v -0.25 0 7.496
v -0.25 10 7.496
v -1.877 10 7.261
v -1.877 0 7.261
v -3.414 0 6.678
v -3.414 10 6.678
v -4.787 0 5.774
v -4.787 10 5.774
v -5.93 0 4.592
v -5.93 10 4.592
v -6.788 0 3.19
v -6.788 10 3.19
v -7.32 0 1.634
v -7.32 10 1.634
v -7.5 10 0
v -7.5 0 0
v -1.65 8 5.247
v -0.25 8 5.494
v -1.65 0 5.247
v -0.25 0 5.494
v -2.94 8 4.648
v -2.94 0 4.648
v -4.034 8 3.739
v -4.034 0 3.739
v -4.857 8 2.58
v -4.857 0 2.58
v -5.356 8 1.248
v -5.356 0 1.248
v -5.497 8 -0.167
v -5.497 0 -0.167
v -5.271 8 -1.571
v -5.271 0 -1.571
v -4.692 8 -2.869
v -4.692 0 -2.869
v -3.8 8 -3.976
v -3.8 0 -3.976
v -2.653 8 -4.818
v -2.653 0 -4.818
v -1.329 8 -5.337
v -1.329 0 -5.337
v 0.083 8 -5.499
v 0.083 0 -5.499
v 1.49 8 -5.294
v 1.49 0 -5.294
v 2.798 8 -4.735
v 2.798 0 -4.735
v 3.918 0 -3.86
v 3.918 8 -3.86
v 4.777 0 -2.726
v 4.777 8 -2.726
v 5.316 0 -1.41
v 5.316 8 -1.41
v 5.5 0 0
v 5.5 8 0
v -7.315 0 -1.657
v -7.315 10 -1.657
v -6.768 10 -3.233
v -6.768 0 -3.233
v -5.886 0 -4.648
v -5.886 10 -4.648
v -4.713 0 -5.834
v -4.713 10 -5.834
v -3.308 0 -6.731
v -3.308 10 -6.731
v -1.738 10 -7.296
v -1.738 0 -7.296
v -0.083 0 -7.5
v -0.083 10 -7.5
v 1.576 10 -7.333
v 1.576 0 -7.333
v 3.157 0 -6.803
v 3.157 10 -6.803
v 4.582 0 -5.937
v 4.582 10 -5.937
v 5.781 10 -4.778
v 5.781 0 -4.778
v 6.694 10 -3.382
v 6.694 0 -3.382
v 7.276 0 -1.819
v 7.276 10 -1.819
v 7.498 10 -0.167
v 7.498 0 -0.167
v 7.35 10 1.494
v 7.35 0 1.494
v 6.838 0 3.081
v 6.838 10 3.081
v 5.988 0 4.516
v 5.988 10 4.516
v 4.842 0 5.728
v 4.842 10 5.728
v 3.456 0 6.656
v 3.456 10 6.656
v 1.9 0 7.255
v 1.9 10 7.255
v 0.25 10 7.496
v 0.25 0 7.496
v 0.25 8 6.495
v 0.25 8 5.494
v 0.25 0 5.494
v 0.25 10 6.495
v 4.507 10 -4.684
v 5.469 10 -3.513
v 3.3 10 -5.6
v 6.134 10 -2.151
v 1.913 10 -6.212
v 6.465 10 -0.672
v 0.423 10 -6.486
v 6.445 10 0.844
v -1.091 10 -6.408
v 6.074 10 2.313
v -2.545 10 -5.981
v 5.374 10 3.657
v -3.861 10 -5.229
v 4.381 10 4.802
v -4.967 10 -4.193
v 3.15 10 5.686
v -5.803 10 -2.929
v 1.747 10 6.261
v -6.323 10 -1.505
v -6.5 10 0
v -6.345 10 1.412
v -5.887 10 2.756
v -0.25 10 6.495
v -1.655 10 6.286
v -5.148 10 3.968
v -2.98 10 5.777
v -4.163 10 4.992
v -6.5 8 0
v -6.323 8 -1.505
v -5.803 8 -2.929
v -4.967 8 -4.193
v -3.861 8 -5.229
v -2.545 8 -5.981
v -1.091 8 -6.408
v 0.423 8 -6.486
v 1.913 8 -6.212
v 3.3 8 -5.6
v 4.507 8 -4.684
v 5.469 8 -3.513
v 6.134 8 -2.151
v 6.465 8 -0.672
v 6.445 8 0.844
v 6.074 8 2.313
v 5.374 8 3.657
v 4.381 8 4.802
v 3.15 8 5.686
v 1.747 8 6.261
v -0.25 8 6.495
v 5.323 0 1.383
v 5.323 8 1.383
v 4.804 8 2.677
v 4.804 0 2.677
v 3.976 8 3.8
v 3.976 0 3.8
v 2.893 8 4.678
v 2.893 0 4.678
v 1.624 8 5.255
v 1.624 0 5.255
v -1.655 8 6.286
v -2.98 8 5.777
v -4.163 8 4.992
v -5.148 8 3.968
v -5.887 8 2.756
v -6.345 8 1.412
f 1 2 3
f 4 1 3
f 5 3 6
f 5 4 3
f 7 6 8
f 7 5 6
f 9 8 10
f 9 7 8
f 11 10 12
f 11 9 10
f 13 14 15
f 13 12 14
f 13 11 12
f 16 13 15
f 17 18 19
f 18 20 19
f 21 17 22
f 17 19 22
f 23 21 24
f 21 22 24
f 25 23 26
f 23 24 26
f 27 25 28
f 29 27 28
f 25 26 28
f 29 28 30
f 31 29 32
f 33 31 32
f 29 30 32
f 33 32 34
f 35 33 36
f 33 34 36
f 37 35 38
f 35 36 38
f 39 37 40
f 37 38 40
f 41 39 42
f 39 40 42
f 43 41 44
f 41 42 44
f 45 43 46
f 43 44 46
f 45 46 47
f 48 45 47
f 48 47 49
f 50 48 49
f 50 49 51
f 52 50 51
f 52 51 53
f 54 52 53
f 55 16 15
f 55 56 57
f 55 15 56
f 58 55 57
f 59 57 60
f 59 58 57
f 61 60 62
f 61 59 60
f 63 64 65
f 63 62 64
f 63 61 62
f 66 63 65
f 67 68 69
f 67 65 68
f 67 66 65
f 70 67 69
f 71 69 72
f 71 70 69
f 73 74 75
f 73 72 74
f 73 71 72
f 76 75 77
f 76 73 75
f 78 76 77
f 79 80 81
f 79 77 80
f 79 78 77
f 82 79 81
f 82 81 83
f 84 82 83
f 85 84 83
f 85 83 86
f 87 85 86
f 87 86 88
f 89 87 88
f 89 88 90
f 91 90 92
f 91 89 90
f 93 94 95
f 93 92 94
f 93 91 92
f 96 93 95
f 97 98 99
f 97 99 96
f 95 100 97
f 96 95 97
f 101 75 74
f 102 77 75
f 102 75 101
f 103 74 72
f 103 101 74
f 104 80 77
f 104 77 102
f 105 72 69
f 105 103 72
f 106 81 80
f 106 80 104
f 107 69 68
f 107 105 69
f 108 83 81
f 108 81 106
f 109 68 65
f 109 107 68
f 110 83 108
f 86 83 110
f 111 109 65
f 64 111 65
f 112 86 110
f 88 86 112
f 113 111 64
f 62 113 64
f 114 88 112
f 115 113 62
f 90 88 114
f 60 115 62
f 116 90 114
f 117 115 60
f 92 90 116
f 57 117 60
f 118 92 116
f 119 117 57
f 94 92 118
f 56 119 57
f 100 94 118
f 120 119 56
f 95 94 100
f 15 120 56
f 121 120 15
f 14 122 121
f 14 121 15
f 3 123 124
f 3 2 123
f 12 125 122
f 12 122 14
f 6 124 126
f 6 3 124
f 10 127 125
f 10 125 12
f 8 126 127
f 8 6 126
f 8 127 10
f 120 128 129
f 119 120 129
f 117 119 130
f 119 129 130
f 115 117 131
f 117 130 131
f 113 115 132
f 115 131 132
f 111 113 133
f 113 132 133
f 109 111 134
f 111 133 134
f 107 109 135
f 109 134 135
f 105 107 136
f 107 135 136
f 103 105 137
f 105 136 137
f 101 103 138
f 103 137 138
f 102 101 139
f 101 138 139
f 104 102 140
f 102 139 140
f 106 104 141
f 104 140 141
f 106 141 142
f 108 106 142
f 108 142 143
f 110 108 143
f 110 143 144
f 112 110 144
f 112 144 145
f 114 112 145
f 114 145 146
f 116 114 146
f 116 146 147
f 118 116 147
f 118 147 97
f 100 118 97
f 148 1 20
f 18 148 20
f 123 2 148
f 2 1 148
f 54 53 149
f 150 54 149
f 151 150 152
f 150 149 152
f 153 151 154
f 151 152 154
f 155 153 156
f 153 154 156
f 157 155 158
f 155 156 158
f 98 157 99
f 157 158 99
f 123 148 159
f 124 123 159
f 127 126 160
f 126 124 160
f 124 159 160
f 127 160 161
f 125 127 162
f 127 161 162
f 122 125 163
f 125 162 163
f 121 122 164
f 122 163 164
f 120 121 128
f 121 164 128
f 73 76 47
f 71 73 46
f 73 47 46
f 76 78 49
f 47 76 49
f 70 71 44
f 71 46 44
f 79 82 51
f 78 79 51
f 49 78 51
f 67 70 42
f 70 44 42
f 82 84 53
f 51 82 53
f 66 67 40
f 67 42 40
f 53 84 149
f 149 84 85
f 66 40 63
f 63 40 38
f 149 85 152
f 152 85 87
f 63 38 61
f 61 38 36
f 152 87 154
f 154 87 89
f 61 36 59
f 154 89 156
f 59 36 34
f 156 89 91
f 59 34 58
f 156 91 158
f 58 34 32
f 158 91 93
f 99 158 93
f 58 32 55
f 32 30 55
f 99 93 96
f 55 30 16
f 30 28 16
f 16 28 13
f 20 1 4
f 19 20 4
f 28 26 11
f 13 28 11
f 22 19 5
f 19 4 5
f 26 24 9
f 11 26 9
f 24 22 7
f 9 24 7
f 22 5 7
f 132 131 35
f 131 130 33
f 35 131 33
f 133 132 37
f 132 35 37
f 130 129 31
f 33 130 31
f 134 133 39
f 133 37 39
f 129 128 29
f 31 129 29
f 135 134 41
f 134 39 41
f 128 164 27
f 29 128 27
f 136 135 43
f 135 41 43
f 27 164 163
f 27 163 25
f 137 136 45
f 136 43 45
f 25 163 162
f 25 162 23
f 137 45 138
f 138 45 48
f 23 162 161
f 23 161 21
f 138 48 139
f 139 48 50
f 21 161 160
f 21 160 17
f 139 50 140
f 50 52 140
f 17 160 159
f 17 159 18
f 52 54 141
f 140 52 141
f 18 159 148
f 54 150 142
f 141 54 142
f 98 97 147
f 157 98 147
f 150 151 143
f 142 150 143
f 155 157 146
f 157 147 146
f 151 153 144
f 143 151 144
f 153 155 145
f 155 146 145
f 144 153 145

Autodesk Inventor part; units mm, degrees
ref_plane "YZ Plane" through (0, 0, 0) normal (1, 0, 0) x (0, 1, 0)
ref_plane "XZ Plane" through (0, 0, 0) normal (0, 1, 0) x (-1, 0, 0)
ref_plane "XY Plane" through (0, 0, 0) normal (0, 0, 1) x (1, 0, 0)
sketch "スケッチ1" plane through (0, 0, 0) normal (0, 1, 0) x (-1, 0, 0)
  circle A0 centre (0, 0) radius 6.5
  circle A1 centre (0, 0) radius 7.5
  dimension "d0" = 13
  dimension "d11" = 1
extrude "押し出し1" add sketch "スケッチ1" along normal blind 10
sketch "スケッチ2" plane through (0, 0, 0) normal (0, -1, 0) x (1, 0, 0)
  circle A0 centre (0, 0) radius 5.5
  circle A1 centre (0, 0) radius 6.5 projected
  dimension "d12" = 1
extrude "押し出し2" add sketch "スケッチ2" against normal blind 8
sketch "スケッチ3" plane through (0, 10, 0) normal (0, 1, 0) x (1, 0, 0)
  line L0 (0.25, -2.9943) -> (0.25, -7.9943)
  line L1 (0.25, -7.9943) -> (-0.25, -7.9943)
  line L2 (-0.25, -7.9943) -> (-0.25, -2.9943)
  line L3 (-0.25, -2.9943) -> (0, -2.9943)
  line L4 (0, -2.9943) -> (0.25, -2.9943)
  circle A0 centre (0, 0) radius 5.5 projected
  point P0 (0.25, -5.4943)
  dimension "d7" = 0.5
  dimension "d10" = 5
extrude "押し出し3" cut sketch "スケッチ3" against normal through all contours L0 A0 L2 L3 L4 | L0 L1 L2 A0 picked at (-0.1111, -3.8293)
properties part number "zig64"
